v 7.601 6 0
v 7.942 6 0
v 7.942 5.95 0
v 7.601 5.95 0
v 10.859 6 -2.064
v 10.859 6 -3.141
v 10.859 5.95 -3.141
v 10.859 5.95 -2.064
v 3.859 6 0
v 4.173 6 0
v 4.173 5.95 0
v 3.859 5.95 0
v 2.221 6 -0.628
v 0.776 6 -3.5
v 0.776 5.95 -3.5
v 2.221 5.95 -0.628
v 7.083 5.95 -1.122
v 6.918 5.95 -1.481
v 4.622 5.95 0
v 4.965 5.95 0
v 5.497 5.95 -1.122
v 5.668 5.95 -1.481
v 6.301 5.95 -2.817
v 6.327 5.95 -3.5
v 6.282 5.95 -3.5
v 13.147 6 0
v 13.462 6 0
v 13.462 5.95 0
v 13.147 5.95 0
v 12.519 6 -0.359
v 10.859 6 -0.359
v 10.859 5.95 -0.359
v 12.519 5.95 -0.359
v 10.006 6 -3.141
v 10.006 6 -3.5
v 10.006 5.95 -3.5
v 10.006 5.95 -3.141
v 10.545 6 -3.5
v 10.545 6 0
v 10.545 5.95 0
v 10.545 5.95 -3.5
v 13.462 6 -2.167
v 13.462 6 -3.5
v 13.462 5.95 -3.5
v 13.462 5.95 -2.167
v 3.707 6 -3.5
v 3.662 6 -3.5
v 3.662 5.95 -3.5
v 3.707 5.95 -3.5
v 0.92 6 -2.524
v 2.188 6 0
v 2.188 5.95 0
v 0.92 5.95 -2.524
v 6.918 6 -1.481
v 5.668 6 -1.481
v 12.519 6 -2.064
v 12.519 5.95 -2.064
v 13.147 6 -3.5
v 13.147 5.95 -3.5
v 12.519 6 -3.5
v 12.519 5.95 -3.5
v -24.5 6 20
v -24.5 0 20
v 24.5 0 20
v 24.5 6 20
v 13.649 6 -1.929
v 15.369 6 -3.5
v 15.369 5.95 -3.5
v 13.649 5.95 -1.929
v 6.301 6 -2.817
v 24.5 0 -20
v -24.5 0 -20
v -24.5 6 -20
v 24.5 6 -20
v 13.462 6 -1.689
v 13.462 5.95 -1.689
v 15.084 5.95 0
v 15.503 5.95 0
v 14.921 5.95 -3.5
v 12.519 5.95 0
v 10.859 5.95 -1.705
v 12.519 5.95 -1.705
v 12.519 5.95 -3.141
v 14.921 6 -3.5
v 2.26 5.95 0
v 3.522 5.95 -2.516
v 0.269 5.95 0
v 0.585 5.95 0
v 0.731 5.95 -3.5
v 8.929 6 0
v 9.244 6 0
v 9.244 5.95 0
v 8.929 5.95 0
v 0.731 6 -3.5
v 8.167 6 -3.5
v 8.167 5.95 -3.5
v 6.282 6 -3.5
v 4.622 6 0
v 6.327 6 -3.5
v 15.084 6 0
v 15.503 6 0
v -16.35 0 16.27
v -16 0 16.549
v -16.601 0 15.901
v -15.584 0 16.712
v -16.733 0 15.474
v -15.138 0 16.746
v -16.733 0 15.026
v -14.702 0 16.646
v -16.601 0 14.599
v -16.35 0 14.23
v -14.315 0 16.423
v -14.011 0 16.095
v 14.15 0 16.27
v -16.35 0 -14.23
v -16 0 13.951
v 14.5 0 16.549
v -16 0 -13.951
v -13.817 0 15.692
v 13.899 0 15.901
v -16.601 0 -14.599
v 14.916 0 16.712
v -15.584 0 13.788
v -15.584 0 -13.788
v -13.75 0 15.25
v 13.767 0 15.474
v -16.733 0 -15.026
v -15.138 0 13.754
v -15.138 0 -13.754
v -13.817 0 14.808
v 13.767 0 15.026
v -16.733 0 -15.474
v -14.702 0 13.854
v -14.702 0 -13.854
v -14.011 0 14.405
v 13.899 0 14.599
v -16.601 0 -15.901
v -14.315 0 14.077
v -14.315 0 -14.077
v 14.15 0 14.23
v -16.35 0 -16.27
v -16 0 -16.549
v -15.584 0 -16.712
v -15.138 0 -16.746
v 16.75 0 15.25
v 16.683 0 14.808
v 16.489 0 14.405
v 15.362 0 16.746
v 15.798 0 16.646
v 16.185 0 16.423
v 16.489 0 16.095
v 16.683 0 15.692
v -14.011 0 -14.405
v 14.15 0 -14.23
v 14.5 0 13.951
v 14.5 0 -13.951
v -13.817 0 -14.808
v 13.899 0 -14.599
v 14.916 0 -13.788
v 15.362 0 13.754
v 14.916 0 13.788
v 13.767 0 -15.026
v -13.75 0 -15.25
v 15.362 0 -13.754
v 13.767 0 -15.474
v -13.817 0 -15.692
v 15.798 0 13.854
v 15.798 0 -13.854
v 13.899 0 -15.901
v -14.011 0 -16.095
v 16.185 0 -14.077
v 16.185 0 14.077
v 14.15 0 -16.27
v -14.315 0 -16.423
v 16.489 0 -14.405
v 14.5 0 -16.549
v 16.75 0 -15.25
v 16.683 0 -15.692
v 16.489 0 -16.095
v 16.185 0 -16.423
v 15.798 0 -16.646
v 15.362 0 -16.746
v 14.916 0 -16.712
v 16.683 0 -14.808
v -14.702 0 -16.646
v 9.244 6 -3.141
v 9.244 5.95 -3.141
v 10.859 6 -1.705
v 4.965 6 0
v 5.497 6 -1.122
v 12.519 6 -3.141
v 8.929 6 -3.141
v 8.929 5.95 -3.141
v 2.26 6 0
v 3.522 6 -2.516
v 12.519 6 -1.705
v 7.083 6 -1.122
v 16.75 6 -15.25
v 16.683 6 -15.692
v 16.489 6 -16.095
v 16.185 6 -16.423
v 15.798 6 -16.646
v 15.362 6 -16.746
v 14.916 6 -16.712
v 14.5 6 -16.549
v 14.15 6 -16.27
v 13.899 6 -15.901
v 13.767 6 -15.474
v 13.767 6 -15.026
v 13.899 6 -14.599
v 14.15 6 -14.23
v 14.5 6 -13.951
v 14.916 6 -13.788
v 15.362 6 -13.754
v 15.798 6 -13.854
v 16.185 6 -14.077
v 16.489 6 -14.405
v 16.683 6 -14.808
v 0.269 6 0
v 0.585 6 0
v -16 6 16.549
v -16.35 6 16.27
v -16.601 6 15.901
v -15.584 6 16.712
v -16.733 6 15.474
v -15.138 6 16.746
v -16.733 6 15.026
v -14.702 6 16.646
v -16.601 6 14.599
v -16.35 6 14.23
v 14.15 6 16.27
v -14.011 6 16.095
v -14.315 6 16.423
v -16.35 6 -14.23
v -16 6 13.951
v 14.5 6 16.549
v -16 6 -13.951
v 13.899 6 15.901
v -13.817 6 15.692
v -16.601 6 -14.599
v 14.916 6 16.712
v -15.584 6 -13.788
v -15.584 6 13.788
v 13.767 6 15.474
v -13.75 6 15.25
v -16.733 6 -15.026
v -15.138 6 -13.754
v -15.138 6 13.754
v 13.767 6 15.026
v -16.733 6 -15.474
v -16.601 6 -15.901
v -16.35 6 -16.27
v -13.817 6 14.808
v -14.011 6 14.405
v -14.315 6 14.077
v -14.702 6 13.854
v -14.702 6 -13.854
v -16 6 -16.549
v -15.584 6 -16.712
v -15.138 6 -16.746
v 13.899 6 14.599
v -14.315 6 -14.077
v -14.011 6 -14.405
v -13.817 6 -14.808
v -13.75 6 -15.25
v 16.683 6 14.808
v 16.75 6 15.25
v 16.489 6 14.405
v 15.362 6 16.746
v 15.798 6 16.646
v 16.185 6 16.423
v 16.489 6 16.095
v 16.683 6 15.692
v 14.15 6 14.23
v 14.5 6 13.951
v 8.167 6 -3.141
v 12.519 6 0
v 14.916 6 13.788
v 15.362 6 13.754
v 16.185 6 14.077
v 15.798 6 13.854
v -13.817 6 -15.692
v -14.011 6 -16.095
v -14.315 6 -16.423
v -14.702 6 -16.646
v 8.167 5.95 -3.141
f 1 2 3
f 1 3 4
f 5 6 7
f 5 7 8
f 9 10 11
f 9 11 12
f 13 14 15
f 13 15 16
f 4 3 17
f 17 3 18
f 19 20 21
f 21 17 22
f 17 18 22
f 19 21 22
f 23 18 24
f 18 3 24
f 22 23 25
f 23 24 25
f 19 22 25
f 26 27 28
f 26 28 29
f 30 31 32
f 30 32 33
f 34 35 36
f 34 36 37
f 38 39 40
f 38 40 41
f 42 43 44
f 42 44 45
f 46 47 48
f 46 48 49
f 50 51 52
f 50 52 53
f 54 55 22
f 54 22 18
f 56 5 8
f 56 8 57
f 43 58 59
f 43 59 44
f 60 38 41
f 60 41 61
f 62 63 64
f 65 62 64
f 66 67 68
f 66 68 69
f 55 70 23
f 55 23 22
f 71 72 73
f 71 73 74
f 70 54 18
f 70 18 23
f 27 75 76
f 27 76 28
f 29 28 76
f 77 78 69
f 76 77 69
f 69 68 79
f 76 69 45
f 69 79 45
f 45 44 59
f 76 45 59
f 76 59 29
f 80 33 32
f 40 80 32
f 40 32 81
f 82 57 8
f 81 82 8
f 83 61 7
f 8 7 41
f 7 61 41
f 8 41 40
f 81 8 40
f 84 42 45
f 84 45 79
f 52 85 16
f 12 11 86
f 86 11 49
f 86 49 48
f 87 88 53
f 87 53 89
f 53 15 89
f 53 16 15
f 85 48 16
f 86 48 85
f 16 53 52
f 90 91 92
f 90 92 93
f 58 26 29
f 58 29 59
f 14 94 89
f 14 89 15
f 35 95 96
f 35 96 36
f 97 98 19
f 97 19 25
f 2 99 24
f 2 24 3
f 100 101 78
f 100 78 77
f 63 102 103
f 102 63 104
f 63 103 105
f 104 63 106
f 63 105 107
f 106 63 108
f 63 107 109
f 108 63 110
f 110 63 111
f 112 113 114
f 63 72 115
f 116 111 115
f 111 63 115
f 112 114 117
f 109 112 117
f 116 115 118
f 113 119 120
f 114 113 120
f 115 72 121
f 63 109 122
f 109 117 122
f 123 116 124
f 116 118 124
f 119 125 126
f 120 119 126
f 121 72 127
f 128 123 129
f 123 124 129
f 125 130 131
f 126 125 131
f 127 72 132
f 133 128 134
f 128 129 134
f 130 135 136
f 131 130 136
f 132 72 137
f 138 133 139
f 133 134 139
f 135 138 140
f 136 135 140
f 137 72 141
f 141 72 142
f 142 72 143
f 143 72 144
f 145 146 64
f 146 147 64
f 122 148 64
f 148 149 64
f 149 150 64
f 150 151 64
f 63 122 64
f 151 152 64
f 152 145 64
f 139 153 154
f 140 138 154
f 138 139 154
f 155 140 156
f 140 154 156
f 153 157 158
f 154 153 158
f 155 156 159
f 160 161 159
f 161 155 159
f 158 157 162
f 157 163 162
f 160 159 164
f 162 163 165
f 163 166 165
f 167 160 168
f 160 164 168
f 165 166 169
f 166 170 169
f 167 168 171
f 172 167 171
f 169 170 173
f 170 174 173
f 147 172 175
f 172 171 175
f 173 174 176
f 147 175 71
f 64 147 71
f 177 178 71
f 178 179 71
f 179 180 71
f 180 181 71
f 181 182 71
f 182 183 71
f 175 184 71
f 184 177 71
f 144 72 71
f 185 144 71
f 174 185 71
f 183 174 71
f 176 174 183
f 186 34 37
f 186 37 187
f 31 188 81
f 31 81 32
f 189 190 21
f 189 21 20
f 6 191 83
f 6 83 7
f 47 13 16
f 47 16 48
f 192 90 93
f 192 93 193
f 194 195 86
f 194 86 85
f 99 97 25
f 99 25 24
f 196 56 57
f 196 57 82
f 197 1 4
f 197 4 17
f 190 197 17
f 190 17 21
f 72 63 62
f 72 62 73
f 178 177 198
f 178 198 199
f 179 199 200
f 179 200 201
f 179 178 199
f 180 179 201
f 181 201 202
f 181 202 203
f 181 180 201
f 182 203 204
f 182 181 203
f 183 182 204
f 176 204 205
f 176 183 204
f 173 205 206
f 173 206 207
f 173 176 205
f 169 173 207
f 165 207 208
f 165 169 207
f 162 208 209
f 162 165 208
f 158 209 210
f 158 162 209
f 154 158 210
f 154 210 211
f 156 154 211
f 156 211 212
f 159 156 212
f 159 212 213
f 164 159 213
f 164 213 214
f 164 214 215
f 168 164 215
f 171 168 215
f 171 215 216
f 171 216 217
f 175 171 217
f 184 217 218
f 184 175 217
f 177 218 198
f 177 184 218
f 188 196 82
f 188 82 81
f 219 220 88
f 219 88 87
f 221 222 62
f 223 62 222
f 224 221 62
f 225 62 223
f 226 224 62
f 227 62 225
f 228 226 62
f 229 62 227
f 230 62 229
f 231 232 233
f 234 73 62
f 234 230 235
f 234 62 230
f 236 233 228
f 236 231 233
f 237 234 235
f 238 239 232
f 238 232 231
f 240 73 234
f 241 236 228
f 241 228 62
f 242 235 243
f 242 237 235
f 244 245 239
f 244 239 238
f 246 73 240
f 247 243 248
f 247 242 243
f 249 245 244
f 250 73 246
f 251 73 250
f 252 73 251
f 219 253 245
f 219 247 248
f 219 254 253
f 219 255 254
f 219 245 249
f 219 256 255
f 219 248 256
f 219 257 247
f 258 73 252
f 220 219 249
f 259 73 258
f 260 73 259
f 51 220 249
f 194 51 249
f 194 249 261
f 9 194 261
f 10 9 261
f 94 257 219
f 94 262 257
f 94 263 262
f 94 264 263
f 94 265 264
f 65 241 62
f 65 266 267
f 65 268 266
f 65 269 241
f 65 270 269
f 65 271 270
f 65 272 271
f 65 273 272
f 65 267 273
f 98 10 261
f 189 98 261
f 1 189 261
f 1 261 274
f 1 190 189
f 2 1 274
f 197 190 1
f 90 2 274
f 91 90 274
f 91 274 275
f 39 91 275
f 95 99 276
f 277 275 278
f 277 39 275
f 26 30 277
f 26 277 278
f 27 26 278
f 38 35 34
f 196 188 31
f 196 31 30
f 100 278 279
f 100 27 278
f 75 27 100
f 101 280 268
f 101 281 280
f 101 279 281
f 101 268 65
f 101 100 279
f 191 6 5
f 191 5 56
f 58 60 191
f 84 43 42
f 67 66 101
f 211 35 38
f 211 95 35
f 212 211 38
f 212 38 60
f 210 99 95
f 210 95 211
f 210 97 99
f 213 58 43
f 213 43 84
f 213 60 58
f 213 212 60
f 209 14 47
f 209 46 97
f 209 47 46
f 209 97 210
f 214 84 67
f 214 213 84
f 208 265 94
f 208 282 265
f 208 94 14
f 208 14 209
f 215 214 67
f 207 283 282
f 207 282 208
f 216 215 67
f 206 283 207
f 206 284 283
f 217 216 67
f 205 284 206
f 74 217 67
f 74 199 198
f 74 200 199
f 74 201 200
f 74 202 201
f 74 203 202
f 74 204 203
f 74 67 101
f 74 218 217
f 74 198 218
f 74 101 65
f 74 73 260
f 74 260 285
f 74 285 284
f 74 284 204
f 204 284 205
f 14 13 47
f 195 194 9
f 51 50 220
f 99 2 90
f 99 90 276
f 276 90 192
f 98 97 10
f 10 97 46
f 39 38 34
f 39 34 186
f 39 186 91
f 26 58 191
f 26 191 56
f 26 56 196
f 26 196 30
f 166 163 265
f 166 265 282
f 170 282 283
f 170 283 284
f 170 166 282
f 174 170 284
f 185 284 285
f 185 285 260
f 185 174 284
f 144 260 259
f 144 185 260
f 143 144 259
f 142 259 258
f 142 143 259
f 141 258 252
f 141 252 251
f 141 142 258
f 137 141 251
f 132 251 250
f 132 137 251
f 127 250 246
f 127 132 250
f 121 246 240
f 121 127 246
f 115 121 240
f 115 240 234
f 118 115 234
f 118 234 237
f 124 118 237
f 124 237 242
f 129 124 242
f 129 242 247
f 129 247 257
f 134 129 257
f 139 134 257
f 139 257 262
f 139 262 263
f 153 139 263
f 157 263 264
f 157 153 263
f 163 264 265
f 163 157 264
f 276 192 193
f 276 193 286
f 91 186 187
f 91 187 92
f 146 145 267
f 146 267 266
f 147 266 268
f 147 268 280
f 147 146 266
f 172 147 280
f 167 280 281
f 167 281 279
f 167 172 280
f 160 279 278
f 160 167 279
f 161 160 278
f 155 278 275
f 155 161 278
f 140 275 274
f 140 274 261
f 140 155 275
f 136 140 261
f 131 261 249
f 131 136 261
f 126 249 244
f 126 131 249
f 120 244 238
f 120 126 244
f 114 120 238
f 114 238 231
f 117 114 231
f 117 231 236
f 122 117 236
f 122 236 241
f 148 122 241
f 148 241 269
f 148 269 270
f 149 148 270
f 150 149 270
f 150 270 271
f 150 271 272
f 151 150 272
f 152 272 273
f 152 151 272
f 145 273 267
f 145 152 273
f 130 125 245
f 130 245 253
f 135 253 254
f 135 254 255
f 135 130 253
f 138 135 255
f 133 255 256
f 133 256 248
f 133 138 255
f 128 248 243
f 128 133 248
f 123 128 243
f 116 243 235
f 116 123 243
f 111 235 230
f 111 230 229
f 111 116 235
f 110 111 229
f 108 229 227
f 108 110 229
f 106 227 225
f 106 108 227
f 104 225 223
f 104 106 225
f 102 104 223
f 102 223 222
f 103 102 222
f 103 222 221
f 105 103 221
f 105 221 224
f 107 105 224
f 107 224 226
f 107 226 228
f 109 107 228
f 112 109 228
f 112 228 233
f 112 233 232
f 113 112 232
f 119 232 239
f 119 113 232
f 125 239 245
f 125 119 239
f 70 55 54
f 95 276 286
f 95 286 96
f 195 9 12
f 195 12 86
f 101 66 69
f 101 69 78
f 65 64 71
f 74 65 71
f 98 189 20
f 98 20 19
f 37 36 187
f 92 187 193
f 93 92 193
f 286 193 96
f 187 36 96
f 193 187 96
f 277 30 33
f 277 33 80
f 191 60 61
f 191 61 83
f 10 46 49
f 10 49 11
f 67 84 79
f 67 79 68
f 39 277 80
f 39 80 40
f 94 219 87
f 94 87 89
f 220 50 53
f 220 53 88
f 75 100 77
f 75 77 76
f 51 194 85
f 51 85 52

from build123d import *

# Parameters (mm, degrees)
SKETCH1_W           = 49
SKETCH1_H           = 40
SKETCH1_R           = 1.5
BOSS_EXTRUDE1_DEPTH = 6
CUT_EXTRUDE1_DEPTH  = 0.05


with BuildPart() as part:
    # Sketch1 → Boss-Extrude1 (new body)
    with BuildSketch(Plane(origin=(0, 0, 0), x_dir=(1, 0, 0), z_dir=(0, 1, 0))):
        Rectangle(SKETCH1_W, SKETCH1_H)
        with Locations((-15.25, 15.25)):
            Circle(SKETCH1_R, mode=Mode.SUBTRACT)
        with Locations((15.25, 15.25)):
            Circle(SKETCH1_R, mode=Mode.SUBTRACT)
        with Locations((15.25, -15.25)):
            Circle(SKETCH1_R, mode=Mode.SUBTRACT)
        with Locations((-15.25, -15.25)):
            Circle(SKETCH1_R, mode=Mode.SUBTRACT)
    extrude(amount=BOSS_EXTRUDE1_DEPTH)

    # Sketch2 → Cut-Extrude1 (cut)
    with BuildSketch(Plane(origin=(0, 6, 0), x_dir=(1, 0, 0), z_dir=(0, 1, 0))):
        Polygon((0.269230769, 0), (0.731270032, 3.5), (0.776141827, 3.5), (2.221153846, 0.628205128), (3.661959135, 3.5), (3.706830929, 3.5), (4.173076923, 0), (3.858974359, 0), (3.522435897, 2.516326122), (2.259715545, 0), (2.188201122, 0), (0.919871795, 2.524038462), (0.585436699, 0), align=None)
        Polygon((6.326923077, 3.5), (7.942307692, 0), (7.600861378, 0), (7.083433494, 1.121794872), (5.496794872, 1.121794872), (4.965344551, 0), (4.621794872, 0), (6.282051282, 3.5), align=None)
        Polygon((6.300981571, 2.817107372), (5.66786859, 1.480769231), (6.91796875, 1.480769231), align=None, mode=Mode.SUBTRACT)
        Polygon((8.166666667, 3.141025641), (8.166666667, 3.5), (10.006410256, 3.5), (10.006410256, 3.141025641), (9.243589744, 3.141025641), (9.243589744, 0), (8.929487179, 0), (8.929487179, 3.141025641), align=None)
        Polygon((10.544871795, 3.5), (12.519230769, 3.5), (12.519230769, 3.141025641), (10.858974359, 3.141025641), (10.858974359, 2.064102564), (12.519230769, 2.064102564), (12.519230769, 1.705128205), (10.858974359, 1.705128205), (10.858974359, 0.358974359), (12.519230769, 0.358974359), (12.519230769, 0), (10.544871795, 0), align=None)
        Polygon((13.147435897, 3.5), (13.461538462, 3.5), (13.461538462, 2.167167468), (14.920572917, 3.5), (15.368589744, 3.5), (13.648737981, 1.929487179), (15.503205128, 0), (15.083934295, 0), (13.461538462, 1.689002404), (13.461538462, 0), (13.147435897, 0), align=None)
    extrude(amount=-CUT_EXTRUDE1_DEPTH, mode=Mode.SUBTRACT)


solid = part.part
